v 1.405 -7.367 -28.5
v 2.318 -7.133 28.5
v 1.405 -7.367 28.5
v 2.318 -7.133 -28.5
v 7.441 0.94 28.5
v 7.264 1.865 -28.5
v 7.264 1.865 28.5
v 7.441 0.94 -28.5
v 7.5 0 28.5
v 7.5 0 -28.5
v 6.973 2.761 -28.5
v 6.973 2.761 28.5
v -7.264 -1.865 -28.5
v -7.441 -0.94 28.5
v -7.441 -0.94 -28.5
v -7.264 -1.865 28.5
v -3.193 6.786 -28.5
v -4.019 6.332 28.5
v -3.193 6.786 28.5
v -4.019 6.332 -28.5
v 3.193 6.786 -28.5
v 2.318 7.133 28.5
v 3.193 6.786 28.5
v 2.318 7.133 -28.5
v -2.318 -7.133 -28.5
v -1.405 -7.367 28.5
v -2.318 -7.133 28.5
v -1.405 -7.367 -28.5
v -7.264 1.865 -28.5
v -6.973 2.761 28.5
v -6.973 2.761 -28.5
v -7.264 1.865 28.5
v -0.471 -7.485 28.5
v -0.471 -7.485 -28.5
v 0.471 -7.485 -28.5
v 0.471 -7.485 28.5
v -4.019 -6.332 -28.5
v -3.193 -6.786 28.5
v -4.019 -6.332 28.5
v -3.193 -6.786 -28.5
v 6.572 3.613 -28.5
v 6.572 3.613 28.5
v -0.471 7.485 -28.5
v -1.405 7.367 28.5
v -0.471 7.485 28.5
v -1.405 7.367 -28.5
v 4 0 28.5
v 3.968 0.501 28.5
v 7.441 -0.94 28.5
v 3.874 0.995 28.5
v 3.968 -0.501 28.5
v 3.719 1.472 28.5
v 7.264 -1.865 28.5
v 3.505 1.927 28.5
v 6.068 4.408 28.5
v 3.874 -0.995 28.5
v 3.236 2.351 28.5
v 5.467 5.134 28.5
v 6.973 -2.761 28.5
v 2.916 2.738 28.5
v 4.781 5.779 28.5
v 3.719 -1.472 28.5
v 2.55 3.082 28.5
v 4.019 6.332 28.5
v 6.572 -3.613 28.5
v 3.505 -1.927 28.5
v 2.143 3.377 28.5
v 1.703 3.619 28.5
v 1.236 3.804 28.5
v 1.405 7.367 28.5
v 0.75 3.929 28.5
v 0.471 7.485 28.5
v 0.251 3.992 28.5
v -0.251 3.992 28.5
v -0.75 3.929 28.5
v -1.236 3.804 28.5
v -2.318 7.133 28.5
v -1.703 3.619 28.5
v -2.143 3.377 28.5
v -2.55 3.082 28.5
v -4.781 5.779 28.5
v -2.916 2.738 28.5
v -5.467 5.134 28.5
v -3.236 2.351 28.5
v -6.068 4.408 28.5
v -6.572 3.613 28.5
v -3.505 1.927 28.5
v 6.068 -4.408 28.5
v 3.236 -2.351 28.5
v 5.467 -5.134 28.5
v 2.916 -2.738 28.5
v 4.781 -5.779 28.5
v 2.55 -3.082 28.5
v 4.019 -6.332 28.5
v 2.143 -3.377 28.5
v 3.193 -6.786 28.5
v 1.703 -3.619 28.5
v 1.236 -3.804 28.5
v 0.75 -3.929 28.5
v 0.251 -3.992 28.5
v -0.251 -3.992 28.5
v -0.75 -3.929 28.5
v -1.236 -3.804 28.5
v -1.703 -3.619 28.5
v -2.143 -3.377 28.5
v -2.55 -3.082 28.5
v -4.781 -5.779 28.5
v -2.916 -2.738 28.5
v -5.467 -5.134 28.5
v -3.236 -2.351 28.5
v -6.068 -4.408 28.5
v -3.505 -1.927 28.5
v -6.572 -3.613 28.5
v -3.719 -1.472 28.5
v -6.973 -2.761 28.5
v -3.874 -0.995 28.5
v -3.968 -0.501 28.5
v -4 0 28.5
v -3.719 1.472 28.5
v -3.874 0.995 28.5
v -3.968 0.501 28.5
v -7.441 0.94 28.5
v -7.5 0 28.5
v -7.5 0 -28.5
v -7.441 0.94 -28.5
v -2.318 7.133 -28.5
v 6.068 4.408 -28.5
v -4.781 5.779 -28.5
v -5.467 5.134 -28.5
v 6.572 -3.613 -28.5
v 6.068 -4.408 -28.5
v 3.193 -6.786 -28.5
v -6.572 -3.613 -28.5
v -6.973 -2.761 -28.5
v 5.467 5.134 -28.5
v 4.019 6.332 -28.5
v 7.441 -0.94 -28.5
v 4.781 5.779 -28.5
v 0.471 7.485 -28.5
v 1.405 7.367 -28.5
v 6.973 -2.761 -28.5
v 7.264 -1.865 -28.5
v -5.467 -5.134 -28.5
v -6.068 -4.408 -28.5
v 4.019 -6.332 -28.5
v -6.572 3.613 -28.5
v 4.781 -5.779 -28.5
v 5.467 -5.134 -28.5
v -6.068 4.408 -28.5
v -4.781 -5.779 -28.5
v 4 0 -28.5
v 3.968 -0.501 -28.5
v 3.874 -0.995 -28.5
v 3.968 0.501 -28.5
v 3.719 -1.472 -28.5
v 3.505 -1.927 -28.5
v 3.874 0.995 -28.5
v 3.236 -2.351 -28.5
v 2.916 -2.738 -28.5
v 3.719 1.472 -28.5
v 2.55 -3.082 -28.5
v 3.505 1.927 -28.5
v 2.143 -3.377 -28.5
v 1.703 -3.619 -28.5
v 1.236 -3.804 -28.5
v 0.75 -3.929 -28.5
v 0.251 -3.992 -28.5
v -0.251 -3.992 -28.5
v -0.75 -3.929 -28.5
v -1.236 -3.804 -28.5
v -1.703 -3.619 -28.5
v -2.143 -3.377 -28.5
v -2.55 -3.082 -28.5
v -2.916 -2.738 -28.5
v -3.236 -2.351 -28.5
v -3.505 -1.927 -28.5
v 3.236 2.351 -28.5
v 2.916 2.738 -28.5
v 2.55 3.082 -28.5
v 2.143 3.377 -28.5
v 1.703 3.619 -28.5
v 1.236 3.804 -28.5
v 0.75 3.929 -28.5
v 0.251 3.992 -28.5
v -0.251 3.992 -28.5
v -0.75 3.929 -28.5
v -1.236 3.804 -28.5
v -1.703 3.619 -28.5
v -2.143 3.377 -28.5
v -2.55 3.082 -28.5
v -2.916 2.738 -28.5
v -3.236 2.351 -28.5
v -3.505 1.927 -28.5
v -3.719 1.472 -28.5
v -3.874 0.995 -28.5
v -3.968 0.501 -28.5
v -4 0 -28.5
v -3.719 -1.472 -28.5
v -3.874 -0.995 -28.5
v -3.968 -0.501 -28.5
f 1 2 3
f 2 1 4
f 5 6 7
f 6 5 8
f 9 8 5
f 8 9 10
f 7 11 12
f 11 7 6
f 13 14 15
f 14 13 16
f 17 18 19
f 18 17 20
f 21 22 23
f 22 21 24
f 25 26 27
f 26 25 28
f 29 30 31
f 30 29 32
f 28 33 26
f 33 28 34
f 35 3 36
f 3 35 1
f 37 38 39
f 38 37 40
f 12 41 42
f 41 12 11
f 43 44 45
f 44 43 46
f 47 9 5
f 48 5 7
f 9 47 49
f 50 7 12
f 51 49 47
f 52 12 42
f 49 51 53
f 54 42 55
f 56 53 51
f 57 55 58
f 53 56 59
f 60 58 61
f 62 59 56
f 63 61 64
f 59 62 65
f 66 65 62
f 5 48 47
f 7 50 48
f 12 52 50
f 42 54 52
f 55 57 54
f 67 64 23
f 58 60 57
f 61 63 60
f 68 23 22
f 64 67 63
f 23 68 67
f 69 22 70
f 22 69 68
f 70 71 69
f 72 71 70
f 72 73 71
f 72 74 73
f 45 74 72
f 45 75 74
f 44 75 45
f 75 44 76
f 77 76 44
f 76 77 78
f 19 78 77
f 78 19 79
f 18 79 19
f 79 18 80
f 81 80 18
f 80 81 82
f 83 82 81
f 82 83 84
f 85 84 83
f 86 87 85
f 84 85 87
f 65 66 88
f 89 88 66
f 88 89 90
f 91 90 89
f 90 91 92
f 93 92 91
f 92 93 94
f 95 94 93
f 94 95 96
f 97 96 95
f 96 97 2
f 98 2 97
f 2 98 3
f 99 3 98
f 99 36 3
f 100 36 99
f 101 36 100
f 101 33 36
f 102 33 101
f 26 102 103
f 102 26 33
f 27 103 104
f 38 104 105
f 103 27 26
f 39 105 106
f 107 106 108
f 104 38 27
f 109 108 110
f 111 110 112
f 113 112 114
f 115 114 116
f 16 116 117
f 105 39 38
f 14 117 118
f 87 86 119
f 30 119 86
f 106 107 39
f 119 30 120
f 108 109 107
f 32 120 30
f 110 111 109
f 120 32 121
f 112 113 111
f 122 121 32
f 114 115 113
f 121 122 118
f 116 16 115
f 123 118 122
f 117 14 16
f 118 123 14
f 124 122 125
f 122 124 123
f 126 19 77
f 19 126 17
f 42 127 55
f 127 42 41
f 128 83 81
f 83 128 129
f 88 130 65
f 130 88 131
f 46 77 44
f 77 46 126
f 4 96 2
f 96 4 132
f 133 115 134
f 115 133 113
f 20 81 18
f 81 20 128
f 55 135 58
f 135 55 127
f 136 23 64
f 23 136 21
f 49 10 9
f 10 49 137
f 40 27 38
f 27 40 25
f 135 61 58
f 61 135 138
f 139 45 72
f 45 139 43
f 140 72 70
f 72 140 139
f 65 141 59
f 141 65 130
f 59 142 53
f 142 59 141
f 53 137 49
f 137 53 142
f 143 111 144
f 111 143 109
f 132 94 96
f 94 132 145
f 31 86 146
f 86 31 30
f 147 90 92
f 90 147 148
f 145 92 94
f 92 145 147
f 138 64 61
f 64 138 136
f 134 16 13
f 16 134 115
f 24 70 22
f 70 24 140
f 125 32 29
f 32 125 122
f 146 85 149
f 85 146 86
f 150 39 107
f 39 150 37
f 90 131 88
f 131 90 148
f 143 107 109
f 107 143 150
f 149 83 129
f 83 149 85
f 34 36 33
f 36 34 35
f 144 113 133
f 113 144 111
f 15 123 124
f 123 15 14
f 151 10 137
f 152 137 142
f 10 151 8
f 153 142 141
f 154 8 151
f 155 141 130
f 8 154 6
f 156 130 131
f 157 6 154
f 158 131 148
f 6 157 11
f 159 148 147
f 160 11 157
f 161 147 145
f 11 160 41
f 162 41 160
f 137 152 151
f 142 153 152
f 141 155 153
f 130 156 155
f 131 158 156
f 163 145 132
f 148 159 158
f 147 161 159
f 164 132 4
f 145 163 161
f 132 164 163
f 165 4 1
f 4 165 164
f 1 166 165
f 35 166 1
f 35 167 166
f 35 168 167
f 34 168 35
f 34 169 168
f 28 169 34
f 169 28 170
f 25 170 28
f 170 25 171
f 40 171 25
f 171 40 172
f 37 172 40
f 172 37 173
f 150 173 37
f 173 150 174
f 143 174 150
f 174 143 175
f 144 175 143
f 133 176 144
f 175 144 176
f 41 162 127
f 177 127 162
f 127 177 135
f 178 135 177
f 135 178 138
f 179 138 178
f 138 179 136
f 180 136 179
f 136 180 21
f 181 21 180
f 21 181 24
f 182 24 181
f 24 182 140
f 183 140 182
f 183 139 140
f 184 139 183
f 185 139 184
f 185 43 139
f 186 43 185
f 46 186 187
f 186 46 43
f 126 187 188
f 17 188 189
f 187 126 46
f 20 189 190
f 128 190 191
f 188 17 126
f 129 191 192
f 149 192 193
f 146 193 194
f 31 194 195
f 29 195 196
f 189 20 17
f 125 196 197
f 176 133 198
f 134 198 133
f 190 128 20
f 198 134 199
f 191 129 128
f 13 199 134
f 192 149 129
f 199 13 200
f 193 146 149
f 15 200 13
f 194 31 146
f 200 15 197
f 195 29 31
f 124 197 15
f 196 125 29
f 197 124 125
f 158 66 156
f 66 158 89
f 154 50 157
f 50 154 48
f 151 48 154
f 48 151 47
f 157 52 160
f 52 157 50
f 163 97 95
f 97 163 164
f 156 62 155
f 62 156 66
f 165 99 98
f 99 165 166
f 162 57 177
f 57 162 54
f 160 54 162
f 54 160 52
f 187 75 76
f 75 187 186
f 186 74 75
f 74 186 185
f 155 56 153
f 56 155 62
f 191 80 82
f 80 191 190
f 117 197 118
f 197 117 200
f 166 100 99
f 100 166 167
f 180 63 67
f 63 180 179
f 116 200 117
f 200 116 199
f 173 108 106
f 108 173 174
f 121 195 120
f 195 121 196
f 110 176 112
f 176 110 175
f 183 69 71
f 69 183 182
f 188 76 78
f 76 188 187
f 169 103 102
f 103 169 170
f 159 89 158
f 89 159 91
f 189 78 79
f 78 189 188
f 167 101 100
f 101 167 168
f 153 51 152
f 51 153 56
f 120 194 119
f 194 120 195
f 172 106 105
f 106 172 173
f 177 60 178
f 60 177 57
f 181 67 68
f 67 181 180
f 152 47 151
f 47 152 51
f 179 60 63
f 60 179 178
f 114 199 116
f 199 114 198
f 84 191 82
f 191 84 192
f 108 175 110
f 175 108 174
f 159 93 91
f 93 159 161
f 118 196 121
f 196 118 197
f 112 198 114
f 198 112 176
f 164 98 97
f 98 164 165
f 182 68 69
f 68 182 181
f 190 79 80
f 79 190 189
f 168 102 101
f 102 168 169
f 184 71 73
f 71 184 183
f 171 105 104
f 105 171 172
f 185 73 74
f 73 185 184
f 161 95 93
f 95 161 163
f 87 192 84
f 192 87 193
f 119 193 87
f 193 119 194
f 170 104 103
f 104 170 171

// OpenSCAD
$fn = 50;


difference() {
	union() {
		translate(v = [0, 0, -28.5000000000]) {
			cylinder(h = 57, r = 7.5000000000);
		}
	}
	union() {
		translate(v = [0, 0, -100.0000000000]) {
			cylinder(h = 200, r = 4.0000000000);
		}
	}
}
